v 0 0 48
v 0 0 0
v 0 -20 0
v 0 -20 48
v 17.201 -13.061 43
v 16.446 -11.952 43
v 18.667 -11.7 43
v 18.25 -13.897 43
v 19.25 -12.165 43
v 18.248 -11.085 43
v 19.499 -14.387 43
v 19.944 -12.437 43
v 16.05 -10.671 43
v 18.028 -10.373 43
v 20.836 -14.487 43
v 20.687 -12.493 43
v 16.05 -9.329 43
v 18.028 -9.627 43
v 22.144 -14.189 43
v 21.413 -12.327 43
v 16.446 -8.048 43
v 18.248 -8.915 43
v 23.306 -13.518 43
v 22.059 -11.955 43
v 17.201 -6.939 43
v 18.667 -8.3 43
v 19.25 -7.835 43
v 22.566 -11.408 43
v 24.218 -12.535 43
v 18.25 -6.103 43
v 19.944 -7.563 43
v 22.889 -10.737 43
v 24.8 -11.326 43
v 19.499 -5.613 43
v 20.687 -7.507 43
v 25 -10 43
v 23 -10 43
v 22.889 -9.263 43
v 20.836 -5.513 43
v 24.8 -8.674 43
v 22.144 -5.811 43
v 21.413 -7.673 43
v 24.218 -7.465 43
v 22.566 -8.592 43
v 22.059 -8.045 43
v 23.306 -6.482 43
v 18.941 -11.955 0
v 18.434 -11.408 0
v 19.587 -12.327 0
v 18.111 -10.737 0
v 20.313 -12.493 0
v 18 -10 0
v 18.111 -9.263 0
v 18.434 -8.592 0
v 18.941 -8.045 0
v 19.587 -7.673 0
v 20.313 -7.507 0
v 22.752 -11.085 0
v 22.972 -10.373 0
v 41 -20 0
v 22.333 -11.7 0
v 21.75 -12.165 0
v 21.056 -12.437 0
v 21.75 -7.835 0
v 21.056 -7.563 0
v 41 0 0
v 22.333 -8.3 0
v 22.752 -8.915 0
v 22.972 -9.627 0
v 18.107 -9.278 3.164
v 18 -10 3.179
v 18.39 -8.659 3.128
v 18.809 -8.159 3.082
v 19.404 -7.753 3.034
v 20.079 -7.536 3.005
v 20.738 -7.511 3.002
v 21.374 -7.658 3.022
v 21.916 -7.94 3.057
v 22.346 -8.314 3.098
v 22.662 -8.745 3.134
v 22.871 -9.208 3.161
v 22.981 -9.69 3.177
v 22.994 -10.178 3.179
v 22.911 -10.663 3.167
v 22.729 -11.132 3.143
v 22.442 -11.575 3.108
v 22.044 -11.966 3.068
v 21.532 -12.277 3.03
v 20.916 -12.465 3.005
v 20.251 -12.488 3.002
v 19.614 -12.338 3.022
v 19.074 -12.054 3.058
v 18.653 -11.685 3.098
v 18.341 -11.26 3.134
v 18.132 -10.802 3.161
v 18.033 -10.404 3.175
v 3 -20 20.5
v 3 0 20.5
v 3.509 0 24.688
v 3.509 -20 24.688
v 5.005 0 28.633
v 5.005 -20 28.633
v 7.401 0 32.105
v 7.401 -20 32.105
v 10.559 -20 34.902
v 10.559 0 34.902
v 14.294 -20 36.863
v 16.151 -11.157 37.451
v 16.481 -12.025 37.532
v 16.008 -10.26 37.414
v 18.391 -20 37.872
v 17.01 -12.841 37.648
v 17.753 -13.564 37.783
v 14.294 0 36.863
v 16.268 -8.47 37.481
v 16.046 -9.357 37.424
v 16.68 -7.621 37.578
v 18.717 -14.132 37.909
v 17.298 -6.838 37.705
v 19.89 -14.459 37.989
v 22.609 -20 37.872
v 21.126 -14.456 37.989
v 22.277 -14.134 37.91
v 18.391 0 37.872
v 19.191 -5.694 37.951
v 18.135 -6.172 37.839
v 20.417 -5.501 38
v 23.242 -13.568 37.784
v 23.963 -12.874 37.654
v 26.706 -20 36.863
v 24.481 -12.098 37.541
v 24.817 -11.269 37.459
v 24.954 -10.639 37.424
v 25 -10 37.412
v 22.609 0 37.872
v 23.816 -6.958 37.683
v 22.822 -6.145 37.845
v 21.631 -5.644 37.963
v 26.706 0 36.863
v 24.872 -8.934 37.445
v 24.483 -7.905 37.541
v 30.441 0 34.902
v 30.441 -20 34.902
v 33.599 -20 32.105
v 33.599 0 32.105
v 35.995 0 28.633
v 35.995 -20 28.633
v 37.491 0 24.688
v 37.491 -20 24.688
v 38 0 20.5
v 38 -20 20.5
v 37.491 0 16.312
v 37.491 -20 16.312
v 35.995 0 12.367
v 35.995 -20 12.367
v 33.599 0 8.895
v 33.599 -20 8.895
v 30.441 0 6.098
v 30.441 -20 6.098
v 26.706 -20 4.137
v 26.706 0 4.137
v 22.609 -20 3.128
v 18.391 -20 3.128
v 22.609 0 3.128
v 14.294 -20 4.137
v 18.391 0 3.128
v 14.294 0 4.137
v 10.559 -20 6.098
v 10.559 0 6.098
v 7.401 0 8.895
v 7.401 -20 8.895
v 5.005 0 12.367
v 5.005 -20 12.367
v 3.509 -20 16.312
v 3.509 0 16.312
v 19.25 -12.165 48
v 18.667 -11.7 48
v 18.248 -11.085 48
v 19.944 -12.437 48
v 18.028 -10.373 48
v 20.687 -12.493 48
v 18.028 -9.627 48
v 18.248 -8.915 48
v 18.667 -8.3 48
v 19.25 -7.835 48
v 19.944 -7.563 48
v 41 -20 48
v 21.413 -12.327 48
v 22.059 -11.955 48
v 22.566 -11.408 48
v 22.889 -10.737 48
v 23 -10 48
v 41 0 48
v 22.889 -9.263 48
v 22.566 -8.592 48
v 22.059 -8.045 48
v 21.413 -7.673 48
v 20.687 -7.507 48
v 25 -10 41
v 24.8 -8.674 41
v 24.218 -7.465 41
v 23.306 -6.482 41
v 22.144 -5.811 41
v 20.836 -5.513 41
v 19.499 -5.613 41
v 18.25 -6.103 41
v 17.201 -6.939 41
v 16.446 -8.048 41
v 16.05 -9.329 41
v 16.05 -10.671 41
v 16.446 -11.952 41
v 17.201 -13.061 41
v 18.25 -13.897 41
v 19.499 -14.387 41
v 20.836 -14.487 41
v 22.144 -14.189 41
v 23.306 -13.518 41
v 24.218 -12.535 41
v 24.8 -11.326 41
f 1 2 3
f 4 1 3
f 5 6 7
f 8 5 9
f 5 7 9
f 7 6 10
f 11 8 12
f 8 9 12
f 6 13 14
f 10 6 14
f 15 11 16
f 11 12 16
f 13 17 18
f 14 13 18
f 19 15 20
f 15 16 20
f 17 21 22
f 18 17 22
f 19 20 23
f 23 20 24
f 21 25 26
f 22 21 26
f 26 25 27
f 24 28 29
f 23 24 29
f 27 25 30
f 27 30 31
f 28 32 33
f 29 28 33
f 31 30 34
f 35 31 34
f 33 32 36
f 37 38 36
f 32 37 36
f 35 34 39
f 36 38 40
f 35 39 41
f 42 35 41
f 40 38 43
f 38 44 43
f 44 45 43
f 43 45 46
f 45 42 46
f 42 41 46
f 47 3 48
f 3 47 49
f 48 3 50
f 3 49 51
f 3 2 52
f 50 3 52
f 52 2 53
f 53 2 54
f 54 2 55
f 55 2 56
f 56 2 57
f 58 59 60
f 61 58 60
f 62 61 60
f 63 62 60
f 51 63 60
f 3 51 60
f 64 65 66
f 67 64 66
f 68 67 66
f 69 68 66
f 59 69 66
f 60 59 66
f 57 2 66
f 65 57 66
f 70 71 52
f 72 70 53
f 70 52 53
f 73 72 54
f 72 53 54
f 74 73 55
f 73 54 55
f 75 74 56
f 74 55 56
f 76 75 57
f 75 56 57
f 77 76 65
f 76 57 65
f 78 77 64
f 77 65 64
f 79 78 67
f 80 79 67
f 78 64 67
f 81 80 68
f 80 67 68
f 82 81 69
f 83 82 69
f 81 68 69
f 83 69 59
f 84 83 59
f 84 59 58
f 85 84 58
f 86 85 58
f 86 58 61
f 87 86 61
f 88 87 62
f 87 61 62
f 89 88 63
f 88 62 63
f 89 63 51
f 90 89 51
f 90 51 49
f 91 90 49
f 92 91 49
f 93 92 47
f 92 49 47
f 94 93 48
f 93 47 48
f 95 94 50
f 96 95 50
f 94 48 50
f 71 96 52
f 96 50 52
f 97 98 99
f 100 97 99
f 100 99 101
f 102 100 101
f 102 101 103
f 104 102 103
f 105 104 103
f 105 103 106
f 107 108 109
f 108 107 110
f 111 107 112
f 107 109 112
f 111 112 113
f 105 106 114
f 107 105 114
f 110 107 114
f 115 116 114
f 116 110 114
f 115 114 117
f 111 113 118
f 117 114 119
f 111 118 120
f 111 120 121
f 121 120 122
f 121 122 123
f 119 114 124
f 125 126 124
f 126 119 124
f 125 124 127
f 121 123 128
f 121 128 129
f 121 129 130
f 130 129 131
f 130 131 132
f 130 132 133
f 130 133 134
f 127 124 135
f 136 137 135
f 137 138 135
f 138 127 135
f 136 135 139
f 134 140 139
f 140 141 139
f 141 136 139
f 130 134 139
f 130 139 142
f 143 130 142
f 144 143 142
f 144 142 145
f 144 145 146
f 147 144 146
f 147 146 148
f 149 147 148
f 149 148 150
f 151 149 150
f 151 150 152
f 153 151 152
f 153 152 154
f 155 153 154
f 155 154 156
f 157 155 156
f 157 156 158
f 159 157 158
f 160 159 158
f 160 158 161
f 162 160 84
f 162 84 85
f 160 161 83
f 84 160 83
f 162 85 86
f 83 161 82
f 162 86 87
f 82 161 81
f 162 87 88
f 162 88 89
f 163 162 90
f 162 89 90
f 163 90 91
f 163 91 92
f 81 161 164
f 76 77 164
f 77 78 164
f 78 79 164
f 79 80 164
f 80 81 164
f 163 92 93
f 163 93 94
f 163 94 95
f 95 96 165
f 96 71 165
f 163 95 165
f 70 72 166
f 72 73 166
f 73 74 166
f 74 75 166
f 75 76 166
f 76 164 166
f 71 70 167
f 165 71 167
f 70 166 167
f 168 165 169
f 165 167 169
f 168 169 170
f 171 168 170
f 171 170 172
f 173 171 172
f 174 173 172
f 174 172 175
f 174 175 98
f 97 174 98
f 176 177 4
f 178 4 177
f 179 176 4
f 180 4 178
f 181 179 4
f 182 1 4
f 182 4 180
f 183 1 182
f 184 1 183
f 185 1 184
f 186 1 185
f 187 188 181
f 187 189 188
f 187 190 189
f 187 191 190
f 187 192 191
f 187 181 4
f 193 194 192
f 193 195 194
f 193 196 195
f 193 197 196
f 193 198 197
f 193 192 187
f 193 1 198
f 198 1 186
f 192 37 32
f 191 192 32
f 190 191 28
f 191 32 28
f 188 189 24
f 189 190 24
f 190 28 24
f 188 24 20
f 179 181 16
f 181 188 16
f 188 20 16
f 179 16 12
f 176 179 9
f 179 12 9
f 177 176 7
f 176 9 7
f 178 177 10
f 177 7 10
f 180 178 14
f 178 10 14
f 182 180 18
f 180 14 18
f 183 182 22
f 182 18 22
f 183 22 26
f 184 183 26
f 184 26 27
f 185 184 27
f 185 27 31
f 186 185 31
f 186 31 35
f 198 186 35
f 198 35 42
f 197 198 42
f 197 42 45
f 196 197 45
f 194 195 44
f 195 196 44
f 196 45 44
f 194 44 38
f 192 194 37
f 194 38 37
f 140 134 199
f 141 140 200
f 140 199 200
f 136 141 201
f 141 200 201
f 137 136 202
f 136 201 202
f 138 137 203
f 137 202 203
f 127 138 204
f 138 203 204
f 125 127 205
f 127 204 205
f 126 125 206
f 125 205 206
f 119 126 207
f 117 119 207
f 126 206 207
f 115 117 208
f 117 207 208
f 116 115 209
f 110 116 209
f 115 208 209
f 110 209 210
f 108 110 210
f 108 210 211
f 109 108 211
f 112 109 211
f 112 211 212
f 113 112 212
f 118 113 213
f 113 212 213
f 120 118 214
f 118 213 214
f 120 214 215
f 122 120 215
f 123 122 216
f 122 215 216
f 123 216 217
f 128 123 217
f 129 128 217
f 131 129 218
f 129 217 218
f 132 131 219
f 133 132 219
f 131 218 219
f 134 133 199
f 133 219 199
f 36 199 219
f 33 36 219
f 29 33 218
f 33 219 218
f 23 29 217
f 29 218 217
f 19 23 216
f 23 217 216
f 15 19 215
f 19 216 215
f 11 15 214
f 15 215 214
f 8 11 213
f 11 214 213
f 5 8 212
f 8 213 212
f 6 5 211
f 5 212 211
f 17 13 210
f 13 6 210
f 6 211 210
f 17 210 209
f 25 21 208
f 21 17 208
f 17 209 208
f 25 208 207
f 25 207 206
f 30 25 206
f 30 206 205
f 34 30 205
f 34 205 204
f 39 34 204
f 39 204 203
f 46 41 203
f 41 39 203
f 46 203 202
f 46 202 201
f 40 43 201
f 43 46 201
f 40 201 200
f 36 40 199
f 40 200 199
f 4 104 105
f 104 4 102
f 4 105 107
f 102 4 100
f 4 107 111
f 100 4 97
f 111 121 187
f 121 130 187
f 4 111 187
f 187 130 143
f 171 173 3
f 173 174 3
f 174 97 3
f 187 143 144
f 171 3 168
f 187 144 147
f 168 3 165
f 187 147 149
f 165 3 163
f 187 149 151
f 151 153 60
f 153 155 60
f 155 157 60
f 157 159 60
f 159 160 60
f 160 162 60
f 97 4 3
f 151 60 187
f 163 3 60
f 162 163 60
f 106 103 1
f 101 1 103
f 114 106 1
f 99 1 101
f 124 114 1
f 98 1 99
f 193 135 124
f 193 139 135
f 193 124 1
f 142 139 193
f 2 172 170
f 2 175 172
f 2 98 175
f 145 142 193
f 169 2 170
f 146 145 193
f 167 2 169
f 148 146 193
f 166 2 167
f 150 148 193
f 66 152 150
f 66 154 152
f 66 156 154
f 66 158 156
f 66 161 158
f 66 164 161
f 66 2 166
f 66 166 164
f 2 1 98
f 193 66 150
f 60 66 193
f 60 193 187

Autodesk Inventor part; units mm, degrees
ref_plane "YZ Plane" through (0, 0, 0) normal (1, 0, 0) x (0, 1, 0)
ref_plane "XZ Plane" through (0, 0, 0) normal (0, 1, 0) x (-1, 0, 0)
ref_plane "XY Plane" through (0, 0, 0) normal (0, 0, 1) x (1, 0, 0)
sketch "Sketch1" plane through (0, 0, 0) normal (0, 1, 0) x (-1, 0, 0)
  line L0 (0, 0) -> (-41, 0)
  line L1 (-41, 0) -> (-41, 41)
  line L2 (-41, 41) -> (0, 41)
  line L3 (0, 41) -> (0, 0)
  circle A0 centre (-20.5, 20.5) radius 17.5
  point P0 (-20.5, 0)
  dimension "d0" = 41
  dimension "d1" = 41
  dimension "d2" = 20.5
  dimension "d3" = 20.5
  dimension "d4" = 35
extrude "Extrusion1" add sketch "Sketch1" against normal blind 20
sketch "Sketch3" plane through (0, 0, 41) normal (0, 0, 1) x (1, 0, 0)
  circle A0 centre (20.5, -10) radius 4.5
  point P0 (0, 0)
  dimension "d8" = 9
extrude "Extrusion2" cut sketch "Sketch3" against normal blind 5
sketch "Sketch4" plane through (41, 0, 0) normal (0, 0, -1) x (-1, 0, 0)
  circle A0 centre (20.5, -10) radius 4.5 projected
  circle A1 centre (20.5, -10) radius 2.5
  point P0 (41, 0)
  dimension "d11" = 5
extrude "Extrusion3" cut sketch "Sketch4" against normal blind 5 contours A1
sketch "Sketch5" plane through (0, 0, 41) normal (0, 0, 1) x (1, 0, 0)
  line L0 (41, 0) -> (0, 0) projected
  line L1 (0, -20) -> (41, -20) projected
  line L2 (0, 0) -> (41, 0)
  line L3 (41, 0) -> (41, -20)
  line L4 (41, -20) -> (0, -20)
  line L5 (0, -20) -> (0, 0)
  line L6 (0, 0) -> (0, -20) projected
  line L7 (0, 0) -> (41, 0)
  line L8 (41, 0) -> (41, -20)
  line L9 (41, -20) -> (0, -20)
  line L10 (0, -20) -> (0, 0)
  circle A0 centre (20.5, -10) radius 4.5
extrude "Extrusion4" add sketch "Sketch5" along normal blind 2
sketch "Sketch6" plane through (0, 0, 43) normal (0, 0, 1) x (1, 0, 0)
  line L0 (0, 0) -> (0, -20) projected
  line L1 (0, -20) -> (41, -20) projected
  line L2 (0, 0) -> (41, 0)
  line L3 (41, 0) -> (41, -20)
  line L4 (41, -20) -> (0, -20)
  line L5 (0, -20) -> (0, 0)
  circle A0 centre (20.5, -10) radius 2.5
extrude "Extrusion5" add sketch "Sketch6" along normal blind 5
equation "\"d1\" = d0"
equation "\"d2\" = 0.5 * d1"
equation "\"d3\" = 0.5 * d0"
properties part number "welco mount v01"
